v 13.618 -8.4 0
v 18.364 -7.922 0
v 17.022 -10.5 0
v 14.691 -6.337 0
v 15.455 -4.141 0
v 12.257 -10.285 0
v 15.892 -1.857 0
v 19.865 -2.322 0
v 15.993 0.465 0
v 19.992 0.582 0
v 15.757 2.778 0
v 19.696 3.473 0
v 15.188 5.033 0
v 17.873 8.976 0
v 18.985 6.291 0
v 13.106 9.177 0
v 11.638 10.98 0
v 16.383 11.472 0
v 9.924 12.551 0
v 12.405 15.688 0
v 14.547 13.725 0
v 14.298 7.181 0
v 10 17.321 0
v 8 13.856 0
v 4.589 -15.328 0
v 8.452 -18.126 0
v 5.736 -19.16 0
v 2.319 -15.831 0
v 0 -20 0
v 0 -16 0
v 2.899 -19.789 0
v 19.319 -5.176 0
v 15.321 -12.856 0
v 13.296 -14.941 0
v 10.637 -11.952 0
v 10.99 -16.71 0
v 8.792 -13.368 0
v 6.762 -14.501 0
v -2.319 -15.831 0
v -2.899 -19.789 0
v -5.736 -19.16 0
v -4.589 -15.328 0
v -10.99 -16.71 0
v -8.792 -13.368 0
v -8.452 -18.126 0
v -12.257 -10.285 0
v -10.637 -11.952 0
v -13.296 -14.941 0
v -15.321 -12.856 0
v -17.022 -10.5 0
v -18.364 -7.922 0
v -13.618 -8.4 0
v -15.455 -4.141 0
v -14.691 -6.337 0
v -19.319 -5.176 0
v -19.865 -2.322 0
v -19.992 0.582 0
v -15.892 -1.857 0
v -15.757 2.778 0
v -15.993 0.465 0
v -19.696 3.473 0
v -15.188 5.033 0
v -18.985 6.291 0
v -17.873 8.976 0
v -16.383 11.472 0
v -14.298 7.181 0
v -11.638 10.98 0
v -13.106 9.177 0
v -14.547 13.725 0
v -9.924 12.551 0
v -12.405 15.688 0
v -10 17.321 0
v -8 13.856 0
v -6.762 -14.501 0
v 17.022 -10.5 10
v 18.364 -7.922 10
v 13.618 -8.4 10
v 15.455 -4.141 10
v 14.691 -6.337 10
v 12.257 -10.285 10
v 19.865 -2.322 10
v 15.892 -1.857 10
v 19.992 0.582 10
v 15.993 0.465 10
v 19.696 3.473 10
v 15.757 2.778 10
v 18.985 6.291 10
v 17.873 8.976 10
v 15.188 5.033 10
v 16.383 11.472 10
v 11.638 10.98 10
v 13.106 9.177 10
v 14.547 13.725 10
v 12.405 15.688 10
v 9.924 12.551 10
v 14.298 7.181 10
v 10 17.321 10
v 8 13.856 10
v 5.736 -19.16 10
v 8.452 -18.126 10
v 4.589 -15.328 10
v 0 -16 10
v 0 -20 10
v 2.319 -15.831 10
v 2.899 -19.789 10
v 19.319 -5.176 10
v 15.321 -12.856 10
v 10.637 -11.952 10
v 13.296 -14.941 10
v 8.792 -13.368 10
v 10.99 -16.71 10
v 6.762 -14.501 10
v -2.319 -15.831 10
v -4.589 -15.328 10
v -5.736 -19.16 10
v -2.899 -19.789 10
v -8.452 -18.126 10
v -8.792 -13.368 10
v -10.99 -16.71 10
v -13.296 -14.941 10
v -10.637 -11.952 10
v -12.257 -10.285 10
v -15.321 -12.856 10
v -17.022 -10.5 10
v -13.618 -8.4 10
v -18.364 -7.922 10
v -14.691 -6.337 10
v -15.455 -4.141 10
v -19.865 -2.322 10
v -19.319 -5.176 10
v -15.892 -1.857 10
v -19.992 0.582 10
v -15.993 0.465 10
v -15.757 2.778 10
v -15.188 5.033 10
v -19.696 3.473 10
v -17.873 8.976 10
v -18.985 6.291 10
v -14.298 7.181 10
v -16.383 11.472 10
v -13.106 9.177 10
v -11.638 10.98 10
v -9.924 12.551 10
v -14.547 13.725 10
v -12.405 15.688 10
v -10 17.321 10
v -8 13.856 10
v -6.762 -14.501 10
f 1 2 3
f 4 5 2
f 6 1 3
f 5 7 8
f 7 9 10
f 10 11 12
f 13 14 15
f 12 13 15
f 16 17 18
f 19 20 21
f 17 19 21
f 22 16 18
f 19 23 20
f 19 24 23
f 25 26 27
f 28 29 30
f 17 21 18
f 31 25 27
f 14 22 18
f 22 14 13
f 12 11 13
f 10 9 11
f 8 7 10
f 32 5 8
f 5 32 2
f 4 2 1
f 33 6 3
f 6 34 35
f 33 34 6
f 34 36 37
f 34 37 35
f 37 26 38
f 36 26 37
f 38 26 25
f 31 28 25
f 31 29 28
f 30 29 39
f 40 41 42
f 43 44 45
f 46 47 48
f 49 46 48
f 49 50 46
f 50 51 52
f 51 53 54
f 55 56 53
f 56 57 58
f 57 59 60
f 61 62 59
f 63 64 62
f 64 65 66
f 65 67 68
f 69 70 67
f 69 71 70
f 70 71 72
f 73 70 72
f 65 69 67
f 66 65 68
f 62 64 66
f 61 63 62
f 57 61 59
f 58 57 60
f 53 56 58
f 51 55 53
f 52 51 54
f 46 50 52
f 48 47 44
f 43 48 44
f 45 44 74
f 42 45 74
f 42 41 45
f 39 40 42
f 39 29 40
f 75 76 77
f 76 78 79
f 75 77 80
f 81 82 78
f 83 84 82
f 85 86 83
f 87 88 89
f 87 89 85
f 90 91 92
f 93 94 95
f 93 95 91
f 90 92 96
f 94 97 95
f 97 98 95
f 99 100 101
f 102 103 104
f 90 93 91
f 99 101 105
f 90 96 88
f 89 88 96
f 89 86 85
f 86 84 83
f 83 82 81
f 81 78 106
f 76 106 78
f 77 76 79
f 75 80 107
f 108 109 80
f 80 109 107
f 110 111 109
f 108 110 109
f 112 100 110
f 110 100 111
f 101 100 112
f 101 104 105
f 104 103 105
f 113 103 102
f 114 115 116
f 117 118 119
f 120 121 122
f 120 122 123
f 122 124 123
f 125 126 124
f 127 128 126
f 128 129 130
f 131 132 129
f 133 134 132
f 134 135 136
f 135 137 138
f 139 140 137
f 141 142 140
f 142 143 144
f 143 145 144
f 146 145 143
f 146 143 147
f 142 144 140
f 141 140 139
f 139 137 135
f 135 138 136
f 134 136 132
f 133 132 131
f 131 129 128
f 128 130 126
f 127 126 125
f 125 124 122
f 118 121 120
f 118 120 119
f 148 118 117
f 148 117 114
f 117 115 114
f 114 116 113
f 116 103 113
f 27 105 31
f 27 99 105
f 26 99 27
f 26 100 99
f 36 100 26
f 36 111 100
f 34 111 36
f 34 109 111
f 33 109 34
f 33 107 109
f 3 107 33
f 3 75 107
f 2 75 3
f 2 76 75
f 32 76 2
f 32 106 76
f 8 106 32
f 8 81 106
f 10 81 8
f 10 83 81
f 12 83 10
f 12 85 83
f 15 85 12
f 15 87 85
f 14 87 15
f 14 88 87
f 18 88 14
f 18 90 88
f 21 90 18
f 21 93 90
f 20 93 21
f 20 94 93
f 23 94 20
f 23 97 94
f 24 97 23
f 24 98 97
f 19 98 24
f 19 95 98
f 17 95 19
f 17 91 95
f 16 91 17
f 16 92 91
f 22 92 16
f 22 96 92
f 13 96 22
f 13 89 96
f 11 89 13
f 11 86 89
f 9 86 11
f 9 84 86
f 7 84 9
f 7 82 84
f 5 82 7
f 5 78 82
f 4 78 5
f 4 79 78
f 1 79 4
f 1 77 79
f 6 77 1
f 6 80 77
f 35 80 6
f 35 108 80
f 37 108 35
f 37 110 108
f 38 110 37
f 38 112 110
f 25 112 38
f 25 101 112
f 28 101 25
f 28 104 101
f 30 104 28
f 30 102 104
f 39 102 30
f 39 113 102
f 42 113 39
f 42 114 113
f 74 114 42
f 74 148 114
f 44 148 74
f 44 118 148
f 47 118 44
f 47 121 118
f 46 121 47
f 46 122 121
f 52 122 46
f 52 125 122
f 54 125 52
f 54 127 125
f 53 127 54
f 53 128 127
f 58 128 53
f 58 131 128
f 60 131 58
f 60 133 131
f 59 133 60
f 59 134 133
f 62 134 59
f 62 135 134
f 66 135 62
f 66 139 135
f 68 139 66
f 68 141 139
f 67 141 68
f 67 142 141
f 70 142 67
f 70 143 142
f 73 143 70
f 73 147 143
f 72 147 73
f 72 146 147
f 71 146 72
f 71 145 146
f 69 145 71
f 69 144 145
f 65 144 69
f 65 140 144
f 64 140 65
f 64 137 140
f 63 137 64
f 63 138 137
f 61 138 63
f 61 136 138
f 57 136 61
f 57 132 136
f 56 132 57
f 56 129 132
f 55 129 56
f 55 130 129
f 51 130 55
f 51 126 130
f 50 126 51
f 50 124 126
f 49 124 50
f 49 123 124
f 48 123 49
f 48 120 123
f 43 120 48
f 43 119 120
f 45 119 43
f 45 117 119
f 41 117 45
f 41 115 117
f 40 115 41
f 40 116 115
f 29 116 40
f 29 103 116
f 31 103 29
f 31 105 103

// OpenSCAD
$fn = 32;

// ----------------------------------------------------------------------
// Spring clip: 40 mm outside, 4 mm band, 60 degree opening
// ----------------------------------------------------------------------

// --- parameters (mm) ---
outer_r = 20;             // clip outside radius
inner_r = 16;             // clip bore radius
band = 4;                 // band thickness
clip_w = 10;              // clip width
opening = 60;             // opening angle

clip_profile = [[-10, 17.321], [-12.405, 15.688], [-14.547, 13.725], [-16.383, 11.472], [-17.873, 8.976], [-18.985, 6.291], [-19.696, 3.473], [-19.992, 0.582], [-19.865, -2.322], [-19.319, -5.176], [-18.364, -7.922], [-17.022, -10.5], [-15.321, -12.856], [-13.296, -14.941], [-10.99, -16.71], [-8.452, -18.126], [-5.736, -19.16], [-2.899, -19.789], [0, -20], [2.899, -19.789], [5.736, -19.16], [8.452, -18.126], [10.99, -16.71], [13.296, -14.941], [15.321, -12.856], [17.022, -10.5], [18.364, -7.922], [19.319, -5.176], [19.865, -2.322], [19.992, 0.582], [19.696, 3.473], [18.985, 6.291], [17.873, 8.976], [16.383, 11.472], [14.547, 13.725], [12.405, 15.688], [10, 17.321], [8, 13.856], [9.924, 12.551], [11.638, 10.98], [13.106, 9.177], [14.298, 7.181], [15.188, 5.033], [15.757, 2.778], [15.993, 0.465], [15.892, -1.857], [15.455, -4.141], [14.691, -6.337], [13.618, -8.4], [12.257, -10.285], [10.637, -11.952], [8.792, -13.368], [6.762, -14.501], [4.589, -15.328], [2.319, -15.831], [0, -16], [-2.319, -15.831], [-4.589, -15.328], [-6.762, -14.501], [-8.792, -13.368], [-10.637, -11.952], [-12.257, -10.285], [-13.618, -8.4], [-14.691, -6.337], [-15.455, -4.141], [-15.892, -1.857], [-15.993, 0.465], [-15.757, 2.778], [-15.188, 5.033], [-14.298, 7.181], [-13.106, 9.177], [-11.638, 10.98], [-9.924, 12.551], [-8, 13.856]];

difference() {
  union() {
    linear_extrude(height = clip_w) polygon(clip_profile);
  }
}
